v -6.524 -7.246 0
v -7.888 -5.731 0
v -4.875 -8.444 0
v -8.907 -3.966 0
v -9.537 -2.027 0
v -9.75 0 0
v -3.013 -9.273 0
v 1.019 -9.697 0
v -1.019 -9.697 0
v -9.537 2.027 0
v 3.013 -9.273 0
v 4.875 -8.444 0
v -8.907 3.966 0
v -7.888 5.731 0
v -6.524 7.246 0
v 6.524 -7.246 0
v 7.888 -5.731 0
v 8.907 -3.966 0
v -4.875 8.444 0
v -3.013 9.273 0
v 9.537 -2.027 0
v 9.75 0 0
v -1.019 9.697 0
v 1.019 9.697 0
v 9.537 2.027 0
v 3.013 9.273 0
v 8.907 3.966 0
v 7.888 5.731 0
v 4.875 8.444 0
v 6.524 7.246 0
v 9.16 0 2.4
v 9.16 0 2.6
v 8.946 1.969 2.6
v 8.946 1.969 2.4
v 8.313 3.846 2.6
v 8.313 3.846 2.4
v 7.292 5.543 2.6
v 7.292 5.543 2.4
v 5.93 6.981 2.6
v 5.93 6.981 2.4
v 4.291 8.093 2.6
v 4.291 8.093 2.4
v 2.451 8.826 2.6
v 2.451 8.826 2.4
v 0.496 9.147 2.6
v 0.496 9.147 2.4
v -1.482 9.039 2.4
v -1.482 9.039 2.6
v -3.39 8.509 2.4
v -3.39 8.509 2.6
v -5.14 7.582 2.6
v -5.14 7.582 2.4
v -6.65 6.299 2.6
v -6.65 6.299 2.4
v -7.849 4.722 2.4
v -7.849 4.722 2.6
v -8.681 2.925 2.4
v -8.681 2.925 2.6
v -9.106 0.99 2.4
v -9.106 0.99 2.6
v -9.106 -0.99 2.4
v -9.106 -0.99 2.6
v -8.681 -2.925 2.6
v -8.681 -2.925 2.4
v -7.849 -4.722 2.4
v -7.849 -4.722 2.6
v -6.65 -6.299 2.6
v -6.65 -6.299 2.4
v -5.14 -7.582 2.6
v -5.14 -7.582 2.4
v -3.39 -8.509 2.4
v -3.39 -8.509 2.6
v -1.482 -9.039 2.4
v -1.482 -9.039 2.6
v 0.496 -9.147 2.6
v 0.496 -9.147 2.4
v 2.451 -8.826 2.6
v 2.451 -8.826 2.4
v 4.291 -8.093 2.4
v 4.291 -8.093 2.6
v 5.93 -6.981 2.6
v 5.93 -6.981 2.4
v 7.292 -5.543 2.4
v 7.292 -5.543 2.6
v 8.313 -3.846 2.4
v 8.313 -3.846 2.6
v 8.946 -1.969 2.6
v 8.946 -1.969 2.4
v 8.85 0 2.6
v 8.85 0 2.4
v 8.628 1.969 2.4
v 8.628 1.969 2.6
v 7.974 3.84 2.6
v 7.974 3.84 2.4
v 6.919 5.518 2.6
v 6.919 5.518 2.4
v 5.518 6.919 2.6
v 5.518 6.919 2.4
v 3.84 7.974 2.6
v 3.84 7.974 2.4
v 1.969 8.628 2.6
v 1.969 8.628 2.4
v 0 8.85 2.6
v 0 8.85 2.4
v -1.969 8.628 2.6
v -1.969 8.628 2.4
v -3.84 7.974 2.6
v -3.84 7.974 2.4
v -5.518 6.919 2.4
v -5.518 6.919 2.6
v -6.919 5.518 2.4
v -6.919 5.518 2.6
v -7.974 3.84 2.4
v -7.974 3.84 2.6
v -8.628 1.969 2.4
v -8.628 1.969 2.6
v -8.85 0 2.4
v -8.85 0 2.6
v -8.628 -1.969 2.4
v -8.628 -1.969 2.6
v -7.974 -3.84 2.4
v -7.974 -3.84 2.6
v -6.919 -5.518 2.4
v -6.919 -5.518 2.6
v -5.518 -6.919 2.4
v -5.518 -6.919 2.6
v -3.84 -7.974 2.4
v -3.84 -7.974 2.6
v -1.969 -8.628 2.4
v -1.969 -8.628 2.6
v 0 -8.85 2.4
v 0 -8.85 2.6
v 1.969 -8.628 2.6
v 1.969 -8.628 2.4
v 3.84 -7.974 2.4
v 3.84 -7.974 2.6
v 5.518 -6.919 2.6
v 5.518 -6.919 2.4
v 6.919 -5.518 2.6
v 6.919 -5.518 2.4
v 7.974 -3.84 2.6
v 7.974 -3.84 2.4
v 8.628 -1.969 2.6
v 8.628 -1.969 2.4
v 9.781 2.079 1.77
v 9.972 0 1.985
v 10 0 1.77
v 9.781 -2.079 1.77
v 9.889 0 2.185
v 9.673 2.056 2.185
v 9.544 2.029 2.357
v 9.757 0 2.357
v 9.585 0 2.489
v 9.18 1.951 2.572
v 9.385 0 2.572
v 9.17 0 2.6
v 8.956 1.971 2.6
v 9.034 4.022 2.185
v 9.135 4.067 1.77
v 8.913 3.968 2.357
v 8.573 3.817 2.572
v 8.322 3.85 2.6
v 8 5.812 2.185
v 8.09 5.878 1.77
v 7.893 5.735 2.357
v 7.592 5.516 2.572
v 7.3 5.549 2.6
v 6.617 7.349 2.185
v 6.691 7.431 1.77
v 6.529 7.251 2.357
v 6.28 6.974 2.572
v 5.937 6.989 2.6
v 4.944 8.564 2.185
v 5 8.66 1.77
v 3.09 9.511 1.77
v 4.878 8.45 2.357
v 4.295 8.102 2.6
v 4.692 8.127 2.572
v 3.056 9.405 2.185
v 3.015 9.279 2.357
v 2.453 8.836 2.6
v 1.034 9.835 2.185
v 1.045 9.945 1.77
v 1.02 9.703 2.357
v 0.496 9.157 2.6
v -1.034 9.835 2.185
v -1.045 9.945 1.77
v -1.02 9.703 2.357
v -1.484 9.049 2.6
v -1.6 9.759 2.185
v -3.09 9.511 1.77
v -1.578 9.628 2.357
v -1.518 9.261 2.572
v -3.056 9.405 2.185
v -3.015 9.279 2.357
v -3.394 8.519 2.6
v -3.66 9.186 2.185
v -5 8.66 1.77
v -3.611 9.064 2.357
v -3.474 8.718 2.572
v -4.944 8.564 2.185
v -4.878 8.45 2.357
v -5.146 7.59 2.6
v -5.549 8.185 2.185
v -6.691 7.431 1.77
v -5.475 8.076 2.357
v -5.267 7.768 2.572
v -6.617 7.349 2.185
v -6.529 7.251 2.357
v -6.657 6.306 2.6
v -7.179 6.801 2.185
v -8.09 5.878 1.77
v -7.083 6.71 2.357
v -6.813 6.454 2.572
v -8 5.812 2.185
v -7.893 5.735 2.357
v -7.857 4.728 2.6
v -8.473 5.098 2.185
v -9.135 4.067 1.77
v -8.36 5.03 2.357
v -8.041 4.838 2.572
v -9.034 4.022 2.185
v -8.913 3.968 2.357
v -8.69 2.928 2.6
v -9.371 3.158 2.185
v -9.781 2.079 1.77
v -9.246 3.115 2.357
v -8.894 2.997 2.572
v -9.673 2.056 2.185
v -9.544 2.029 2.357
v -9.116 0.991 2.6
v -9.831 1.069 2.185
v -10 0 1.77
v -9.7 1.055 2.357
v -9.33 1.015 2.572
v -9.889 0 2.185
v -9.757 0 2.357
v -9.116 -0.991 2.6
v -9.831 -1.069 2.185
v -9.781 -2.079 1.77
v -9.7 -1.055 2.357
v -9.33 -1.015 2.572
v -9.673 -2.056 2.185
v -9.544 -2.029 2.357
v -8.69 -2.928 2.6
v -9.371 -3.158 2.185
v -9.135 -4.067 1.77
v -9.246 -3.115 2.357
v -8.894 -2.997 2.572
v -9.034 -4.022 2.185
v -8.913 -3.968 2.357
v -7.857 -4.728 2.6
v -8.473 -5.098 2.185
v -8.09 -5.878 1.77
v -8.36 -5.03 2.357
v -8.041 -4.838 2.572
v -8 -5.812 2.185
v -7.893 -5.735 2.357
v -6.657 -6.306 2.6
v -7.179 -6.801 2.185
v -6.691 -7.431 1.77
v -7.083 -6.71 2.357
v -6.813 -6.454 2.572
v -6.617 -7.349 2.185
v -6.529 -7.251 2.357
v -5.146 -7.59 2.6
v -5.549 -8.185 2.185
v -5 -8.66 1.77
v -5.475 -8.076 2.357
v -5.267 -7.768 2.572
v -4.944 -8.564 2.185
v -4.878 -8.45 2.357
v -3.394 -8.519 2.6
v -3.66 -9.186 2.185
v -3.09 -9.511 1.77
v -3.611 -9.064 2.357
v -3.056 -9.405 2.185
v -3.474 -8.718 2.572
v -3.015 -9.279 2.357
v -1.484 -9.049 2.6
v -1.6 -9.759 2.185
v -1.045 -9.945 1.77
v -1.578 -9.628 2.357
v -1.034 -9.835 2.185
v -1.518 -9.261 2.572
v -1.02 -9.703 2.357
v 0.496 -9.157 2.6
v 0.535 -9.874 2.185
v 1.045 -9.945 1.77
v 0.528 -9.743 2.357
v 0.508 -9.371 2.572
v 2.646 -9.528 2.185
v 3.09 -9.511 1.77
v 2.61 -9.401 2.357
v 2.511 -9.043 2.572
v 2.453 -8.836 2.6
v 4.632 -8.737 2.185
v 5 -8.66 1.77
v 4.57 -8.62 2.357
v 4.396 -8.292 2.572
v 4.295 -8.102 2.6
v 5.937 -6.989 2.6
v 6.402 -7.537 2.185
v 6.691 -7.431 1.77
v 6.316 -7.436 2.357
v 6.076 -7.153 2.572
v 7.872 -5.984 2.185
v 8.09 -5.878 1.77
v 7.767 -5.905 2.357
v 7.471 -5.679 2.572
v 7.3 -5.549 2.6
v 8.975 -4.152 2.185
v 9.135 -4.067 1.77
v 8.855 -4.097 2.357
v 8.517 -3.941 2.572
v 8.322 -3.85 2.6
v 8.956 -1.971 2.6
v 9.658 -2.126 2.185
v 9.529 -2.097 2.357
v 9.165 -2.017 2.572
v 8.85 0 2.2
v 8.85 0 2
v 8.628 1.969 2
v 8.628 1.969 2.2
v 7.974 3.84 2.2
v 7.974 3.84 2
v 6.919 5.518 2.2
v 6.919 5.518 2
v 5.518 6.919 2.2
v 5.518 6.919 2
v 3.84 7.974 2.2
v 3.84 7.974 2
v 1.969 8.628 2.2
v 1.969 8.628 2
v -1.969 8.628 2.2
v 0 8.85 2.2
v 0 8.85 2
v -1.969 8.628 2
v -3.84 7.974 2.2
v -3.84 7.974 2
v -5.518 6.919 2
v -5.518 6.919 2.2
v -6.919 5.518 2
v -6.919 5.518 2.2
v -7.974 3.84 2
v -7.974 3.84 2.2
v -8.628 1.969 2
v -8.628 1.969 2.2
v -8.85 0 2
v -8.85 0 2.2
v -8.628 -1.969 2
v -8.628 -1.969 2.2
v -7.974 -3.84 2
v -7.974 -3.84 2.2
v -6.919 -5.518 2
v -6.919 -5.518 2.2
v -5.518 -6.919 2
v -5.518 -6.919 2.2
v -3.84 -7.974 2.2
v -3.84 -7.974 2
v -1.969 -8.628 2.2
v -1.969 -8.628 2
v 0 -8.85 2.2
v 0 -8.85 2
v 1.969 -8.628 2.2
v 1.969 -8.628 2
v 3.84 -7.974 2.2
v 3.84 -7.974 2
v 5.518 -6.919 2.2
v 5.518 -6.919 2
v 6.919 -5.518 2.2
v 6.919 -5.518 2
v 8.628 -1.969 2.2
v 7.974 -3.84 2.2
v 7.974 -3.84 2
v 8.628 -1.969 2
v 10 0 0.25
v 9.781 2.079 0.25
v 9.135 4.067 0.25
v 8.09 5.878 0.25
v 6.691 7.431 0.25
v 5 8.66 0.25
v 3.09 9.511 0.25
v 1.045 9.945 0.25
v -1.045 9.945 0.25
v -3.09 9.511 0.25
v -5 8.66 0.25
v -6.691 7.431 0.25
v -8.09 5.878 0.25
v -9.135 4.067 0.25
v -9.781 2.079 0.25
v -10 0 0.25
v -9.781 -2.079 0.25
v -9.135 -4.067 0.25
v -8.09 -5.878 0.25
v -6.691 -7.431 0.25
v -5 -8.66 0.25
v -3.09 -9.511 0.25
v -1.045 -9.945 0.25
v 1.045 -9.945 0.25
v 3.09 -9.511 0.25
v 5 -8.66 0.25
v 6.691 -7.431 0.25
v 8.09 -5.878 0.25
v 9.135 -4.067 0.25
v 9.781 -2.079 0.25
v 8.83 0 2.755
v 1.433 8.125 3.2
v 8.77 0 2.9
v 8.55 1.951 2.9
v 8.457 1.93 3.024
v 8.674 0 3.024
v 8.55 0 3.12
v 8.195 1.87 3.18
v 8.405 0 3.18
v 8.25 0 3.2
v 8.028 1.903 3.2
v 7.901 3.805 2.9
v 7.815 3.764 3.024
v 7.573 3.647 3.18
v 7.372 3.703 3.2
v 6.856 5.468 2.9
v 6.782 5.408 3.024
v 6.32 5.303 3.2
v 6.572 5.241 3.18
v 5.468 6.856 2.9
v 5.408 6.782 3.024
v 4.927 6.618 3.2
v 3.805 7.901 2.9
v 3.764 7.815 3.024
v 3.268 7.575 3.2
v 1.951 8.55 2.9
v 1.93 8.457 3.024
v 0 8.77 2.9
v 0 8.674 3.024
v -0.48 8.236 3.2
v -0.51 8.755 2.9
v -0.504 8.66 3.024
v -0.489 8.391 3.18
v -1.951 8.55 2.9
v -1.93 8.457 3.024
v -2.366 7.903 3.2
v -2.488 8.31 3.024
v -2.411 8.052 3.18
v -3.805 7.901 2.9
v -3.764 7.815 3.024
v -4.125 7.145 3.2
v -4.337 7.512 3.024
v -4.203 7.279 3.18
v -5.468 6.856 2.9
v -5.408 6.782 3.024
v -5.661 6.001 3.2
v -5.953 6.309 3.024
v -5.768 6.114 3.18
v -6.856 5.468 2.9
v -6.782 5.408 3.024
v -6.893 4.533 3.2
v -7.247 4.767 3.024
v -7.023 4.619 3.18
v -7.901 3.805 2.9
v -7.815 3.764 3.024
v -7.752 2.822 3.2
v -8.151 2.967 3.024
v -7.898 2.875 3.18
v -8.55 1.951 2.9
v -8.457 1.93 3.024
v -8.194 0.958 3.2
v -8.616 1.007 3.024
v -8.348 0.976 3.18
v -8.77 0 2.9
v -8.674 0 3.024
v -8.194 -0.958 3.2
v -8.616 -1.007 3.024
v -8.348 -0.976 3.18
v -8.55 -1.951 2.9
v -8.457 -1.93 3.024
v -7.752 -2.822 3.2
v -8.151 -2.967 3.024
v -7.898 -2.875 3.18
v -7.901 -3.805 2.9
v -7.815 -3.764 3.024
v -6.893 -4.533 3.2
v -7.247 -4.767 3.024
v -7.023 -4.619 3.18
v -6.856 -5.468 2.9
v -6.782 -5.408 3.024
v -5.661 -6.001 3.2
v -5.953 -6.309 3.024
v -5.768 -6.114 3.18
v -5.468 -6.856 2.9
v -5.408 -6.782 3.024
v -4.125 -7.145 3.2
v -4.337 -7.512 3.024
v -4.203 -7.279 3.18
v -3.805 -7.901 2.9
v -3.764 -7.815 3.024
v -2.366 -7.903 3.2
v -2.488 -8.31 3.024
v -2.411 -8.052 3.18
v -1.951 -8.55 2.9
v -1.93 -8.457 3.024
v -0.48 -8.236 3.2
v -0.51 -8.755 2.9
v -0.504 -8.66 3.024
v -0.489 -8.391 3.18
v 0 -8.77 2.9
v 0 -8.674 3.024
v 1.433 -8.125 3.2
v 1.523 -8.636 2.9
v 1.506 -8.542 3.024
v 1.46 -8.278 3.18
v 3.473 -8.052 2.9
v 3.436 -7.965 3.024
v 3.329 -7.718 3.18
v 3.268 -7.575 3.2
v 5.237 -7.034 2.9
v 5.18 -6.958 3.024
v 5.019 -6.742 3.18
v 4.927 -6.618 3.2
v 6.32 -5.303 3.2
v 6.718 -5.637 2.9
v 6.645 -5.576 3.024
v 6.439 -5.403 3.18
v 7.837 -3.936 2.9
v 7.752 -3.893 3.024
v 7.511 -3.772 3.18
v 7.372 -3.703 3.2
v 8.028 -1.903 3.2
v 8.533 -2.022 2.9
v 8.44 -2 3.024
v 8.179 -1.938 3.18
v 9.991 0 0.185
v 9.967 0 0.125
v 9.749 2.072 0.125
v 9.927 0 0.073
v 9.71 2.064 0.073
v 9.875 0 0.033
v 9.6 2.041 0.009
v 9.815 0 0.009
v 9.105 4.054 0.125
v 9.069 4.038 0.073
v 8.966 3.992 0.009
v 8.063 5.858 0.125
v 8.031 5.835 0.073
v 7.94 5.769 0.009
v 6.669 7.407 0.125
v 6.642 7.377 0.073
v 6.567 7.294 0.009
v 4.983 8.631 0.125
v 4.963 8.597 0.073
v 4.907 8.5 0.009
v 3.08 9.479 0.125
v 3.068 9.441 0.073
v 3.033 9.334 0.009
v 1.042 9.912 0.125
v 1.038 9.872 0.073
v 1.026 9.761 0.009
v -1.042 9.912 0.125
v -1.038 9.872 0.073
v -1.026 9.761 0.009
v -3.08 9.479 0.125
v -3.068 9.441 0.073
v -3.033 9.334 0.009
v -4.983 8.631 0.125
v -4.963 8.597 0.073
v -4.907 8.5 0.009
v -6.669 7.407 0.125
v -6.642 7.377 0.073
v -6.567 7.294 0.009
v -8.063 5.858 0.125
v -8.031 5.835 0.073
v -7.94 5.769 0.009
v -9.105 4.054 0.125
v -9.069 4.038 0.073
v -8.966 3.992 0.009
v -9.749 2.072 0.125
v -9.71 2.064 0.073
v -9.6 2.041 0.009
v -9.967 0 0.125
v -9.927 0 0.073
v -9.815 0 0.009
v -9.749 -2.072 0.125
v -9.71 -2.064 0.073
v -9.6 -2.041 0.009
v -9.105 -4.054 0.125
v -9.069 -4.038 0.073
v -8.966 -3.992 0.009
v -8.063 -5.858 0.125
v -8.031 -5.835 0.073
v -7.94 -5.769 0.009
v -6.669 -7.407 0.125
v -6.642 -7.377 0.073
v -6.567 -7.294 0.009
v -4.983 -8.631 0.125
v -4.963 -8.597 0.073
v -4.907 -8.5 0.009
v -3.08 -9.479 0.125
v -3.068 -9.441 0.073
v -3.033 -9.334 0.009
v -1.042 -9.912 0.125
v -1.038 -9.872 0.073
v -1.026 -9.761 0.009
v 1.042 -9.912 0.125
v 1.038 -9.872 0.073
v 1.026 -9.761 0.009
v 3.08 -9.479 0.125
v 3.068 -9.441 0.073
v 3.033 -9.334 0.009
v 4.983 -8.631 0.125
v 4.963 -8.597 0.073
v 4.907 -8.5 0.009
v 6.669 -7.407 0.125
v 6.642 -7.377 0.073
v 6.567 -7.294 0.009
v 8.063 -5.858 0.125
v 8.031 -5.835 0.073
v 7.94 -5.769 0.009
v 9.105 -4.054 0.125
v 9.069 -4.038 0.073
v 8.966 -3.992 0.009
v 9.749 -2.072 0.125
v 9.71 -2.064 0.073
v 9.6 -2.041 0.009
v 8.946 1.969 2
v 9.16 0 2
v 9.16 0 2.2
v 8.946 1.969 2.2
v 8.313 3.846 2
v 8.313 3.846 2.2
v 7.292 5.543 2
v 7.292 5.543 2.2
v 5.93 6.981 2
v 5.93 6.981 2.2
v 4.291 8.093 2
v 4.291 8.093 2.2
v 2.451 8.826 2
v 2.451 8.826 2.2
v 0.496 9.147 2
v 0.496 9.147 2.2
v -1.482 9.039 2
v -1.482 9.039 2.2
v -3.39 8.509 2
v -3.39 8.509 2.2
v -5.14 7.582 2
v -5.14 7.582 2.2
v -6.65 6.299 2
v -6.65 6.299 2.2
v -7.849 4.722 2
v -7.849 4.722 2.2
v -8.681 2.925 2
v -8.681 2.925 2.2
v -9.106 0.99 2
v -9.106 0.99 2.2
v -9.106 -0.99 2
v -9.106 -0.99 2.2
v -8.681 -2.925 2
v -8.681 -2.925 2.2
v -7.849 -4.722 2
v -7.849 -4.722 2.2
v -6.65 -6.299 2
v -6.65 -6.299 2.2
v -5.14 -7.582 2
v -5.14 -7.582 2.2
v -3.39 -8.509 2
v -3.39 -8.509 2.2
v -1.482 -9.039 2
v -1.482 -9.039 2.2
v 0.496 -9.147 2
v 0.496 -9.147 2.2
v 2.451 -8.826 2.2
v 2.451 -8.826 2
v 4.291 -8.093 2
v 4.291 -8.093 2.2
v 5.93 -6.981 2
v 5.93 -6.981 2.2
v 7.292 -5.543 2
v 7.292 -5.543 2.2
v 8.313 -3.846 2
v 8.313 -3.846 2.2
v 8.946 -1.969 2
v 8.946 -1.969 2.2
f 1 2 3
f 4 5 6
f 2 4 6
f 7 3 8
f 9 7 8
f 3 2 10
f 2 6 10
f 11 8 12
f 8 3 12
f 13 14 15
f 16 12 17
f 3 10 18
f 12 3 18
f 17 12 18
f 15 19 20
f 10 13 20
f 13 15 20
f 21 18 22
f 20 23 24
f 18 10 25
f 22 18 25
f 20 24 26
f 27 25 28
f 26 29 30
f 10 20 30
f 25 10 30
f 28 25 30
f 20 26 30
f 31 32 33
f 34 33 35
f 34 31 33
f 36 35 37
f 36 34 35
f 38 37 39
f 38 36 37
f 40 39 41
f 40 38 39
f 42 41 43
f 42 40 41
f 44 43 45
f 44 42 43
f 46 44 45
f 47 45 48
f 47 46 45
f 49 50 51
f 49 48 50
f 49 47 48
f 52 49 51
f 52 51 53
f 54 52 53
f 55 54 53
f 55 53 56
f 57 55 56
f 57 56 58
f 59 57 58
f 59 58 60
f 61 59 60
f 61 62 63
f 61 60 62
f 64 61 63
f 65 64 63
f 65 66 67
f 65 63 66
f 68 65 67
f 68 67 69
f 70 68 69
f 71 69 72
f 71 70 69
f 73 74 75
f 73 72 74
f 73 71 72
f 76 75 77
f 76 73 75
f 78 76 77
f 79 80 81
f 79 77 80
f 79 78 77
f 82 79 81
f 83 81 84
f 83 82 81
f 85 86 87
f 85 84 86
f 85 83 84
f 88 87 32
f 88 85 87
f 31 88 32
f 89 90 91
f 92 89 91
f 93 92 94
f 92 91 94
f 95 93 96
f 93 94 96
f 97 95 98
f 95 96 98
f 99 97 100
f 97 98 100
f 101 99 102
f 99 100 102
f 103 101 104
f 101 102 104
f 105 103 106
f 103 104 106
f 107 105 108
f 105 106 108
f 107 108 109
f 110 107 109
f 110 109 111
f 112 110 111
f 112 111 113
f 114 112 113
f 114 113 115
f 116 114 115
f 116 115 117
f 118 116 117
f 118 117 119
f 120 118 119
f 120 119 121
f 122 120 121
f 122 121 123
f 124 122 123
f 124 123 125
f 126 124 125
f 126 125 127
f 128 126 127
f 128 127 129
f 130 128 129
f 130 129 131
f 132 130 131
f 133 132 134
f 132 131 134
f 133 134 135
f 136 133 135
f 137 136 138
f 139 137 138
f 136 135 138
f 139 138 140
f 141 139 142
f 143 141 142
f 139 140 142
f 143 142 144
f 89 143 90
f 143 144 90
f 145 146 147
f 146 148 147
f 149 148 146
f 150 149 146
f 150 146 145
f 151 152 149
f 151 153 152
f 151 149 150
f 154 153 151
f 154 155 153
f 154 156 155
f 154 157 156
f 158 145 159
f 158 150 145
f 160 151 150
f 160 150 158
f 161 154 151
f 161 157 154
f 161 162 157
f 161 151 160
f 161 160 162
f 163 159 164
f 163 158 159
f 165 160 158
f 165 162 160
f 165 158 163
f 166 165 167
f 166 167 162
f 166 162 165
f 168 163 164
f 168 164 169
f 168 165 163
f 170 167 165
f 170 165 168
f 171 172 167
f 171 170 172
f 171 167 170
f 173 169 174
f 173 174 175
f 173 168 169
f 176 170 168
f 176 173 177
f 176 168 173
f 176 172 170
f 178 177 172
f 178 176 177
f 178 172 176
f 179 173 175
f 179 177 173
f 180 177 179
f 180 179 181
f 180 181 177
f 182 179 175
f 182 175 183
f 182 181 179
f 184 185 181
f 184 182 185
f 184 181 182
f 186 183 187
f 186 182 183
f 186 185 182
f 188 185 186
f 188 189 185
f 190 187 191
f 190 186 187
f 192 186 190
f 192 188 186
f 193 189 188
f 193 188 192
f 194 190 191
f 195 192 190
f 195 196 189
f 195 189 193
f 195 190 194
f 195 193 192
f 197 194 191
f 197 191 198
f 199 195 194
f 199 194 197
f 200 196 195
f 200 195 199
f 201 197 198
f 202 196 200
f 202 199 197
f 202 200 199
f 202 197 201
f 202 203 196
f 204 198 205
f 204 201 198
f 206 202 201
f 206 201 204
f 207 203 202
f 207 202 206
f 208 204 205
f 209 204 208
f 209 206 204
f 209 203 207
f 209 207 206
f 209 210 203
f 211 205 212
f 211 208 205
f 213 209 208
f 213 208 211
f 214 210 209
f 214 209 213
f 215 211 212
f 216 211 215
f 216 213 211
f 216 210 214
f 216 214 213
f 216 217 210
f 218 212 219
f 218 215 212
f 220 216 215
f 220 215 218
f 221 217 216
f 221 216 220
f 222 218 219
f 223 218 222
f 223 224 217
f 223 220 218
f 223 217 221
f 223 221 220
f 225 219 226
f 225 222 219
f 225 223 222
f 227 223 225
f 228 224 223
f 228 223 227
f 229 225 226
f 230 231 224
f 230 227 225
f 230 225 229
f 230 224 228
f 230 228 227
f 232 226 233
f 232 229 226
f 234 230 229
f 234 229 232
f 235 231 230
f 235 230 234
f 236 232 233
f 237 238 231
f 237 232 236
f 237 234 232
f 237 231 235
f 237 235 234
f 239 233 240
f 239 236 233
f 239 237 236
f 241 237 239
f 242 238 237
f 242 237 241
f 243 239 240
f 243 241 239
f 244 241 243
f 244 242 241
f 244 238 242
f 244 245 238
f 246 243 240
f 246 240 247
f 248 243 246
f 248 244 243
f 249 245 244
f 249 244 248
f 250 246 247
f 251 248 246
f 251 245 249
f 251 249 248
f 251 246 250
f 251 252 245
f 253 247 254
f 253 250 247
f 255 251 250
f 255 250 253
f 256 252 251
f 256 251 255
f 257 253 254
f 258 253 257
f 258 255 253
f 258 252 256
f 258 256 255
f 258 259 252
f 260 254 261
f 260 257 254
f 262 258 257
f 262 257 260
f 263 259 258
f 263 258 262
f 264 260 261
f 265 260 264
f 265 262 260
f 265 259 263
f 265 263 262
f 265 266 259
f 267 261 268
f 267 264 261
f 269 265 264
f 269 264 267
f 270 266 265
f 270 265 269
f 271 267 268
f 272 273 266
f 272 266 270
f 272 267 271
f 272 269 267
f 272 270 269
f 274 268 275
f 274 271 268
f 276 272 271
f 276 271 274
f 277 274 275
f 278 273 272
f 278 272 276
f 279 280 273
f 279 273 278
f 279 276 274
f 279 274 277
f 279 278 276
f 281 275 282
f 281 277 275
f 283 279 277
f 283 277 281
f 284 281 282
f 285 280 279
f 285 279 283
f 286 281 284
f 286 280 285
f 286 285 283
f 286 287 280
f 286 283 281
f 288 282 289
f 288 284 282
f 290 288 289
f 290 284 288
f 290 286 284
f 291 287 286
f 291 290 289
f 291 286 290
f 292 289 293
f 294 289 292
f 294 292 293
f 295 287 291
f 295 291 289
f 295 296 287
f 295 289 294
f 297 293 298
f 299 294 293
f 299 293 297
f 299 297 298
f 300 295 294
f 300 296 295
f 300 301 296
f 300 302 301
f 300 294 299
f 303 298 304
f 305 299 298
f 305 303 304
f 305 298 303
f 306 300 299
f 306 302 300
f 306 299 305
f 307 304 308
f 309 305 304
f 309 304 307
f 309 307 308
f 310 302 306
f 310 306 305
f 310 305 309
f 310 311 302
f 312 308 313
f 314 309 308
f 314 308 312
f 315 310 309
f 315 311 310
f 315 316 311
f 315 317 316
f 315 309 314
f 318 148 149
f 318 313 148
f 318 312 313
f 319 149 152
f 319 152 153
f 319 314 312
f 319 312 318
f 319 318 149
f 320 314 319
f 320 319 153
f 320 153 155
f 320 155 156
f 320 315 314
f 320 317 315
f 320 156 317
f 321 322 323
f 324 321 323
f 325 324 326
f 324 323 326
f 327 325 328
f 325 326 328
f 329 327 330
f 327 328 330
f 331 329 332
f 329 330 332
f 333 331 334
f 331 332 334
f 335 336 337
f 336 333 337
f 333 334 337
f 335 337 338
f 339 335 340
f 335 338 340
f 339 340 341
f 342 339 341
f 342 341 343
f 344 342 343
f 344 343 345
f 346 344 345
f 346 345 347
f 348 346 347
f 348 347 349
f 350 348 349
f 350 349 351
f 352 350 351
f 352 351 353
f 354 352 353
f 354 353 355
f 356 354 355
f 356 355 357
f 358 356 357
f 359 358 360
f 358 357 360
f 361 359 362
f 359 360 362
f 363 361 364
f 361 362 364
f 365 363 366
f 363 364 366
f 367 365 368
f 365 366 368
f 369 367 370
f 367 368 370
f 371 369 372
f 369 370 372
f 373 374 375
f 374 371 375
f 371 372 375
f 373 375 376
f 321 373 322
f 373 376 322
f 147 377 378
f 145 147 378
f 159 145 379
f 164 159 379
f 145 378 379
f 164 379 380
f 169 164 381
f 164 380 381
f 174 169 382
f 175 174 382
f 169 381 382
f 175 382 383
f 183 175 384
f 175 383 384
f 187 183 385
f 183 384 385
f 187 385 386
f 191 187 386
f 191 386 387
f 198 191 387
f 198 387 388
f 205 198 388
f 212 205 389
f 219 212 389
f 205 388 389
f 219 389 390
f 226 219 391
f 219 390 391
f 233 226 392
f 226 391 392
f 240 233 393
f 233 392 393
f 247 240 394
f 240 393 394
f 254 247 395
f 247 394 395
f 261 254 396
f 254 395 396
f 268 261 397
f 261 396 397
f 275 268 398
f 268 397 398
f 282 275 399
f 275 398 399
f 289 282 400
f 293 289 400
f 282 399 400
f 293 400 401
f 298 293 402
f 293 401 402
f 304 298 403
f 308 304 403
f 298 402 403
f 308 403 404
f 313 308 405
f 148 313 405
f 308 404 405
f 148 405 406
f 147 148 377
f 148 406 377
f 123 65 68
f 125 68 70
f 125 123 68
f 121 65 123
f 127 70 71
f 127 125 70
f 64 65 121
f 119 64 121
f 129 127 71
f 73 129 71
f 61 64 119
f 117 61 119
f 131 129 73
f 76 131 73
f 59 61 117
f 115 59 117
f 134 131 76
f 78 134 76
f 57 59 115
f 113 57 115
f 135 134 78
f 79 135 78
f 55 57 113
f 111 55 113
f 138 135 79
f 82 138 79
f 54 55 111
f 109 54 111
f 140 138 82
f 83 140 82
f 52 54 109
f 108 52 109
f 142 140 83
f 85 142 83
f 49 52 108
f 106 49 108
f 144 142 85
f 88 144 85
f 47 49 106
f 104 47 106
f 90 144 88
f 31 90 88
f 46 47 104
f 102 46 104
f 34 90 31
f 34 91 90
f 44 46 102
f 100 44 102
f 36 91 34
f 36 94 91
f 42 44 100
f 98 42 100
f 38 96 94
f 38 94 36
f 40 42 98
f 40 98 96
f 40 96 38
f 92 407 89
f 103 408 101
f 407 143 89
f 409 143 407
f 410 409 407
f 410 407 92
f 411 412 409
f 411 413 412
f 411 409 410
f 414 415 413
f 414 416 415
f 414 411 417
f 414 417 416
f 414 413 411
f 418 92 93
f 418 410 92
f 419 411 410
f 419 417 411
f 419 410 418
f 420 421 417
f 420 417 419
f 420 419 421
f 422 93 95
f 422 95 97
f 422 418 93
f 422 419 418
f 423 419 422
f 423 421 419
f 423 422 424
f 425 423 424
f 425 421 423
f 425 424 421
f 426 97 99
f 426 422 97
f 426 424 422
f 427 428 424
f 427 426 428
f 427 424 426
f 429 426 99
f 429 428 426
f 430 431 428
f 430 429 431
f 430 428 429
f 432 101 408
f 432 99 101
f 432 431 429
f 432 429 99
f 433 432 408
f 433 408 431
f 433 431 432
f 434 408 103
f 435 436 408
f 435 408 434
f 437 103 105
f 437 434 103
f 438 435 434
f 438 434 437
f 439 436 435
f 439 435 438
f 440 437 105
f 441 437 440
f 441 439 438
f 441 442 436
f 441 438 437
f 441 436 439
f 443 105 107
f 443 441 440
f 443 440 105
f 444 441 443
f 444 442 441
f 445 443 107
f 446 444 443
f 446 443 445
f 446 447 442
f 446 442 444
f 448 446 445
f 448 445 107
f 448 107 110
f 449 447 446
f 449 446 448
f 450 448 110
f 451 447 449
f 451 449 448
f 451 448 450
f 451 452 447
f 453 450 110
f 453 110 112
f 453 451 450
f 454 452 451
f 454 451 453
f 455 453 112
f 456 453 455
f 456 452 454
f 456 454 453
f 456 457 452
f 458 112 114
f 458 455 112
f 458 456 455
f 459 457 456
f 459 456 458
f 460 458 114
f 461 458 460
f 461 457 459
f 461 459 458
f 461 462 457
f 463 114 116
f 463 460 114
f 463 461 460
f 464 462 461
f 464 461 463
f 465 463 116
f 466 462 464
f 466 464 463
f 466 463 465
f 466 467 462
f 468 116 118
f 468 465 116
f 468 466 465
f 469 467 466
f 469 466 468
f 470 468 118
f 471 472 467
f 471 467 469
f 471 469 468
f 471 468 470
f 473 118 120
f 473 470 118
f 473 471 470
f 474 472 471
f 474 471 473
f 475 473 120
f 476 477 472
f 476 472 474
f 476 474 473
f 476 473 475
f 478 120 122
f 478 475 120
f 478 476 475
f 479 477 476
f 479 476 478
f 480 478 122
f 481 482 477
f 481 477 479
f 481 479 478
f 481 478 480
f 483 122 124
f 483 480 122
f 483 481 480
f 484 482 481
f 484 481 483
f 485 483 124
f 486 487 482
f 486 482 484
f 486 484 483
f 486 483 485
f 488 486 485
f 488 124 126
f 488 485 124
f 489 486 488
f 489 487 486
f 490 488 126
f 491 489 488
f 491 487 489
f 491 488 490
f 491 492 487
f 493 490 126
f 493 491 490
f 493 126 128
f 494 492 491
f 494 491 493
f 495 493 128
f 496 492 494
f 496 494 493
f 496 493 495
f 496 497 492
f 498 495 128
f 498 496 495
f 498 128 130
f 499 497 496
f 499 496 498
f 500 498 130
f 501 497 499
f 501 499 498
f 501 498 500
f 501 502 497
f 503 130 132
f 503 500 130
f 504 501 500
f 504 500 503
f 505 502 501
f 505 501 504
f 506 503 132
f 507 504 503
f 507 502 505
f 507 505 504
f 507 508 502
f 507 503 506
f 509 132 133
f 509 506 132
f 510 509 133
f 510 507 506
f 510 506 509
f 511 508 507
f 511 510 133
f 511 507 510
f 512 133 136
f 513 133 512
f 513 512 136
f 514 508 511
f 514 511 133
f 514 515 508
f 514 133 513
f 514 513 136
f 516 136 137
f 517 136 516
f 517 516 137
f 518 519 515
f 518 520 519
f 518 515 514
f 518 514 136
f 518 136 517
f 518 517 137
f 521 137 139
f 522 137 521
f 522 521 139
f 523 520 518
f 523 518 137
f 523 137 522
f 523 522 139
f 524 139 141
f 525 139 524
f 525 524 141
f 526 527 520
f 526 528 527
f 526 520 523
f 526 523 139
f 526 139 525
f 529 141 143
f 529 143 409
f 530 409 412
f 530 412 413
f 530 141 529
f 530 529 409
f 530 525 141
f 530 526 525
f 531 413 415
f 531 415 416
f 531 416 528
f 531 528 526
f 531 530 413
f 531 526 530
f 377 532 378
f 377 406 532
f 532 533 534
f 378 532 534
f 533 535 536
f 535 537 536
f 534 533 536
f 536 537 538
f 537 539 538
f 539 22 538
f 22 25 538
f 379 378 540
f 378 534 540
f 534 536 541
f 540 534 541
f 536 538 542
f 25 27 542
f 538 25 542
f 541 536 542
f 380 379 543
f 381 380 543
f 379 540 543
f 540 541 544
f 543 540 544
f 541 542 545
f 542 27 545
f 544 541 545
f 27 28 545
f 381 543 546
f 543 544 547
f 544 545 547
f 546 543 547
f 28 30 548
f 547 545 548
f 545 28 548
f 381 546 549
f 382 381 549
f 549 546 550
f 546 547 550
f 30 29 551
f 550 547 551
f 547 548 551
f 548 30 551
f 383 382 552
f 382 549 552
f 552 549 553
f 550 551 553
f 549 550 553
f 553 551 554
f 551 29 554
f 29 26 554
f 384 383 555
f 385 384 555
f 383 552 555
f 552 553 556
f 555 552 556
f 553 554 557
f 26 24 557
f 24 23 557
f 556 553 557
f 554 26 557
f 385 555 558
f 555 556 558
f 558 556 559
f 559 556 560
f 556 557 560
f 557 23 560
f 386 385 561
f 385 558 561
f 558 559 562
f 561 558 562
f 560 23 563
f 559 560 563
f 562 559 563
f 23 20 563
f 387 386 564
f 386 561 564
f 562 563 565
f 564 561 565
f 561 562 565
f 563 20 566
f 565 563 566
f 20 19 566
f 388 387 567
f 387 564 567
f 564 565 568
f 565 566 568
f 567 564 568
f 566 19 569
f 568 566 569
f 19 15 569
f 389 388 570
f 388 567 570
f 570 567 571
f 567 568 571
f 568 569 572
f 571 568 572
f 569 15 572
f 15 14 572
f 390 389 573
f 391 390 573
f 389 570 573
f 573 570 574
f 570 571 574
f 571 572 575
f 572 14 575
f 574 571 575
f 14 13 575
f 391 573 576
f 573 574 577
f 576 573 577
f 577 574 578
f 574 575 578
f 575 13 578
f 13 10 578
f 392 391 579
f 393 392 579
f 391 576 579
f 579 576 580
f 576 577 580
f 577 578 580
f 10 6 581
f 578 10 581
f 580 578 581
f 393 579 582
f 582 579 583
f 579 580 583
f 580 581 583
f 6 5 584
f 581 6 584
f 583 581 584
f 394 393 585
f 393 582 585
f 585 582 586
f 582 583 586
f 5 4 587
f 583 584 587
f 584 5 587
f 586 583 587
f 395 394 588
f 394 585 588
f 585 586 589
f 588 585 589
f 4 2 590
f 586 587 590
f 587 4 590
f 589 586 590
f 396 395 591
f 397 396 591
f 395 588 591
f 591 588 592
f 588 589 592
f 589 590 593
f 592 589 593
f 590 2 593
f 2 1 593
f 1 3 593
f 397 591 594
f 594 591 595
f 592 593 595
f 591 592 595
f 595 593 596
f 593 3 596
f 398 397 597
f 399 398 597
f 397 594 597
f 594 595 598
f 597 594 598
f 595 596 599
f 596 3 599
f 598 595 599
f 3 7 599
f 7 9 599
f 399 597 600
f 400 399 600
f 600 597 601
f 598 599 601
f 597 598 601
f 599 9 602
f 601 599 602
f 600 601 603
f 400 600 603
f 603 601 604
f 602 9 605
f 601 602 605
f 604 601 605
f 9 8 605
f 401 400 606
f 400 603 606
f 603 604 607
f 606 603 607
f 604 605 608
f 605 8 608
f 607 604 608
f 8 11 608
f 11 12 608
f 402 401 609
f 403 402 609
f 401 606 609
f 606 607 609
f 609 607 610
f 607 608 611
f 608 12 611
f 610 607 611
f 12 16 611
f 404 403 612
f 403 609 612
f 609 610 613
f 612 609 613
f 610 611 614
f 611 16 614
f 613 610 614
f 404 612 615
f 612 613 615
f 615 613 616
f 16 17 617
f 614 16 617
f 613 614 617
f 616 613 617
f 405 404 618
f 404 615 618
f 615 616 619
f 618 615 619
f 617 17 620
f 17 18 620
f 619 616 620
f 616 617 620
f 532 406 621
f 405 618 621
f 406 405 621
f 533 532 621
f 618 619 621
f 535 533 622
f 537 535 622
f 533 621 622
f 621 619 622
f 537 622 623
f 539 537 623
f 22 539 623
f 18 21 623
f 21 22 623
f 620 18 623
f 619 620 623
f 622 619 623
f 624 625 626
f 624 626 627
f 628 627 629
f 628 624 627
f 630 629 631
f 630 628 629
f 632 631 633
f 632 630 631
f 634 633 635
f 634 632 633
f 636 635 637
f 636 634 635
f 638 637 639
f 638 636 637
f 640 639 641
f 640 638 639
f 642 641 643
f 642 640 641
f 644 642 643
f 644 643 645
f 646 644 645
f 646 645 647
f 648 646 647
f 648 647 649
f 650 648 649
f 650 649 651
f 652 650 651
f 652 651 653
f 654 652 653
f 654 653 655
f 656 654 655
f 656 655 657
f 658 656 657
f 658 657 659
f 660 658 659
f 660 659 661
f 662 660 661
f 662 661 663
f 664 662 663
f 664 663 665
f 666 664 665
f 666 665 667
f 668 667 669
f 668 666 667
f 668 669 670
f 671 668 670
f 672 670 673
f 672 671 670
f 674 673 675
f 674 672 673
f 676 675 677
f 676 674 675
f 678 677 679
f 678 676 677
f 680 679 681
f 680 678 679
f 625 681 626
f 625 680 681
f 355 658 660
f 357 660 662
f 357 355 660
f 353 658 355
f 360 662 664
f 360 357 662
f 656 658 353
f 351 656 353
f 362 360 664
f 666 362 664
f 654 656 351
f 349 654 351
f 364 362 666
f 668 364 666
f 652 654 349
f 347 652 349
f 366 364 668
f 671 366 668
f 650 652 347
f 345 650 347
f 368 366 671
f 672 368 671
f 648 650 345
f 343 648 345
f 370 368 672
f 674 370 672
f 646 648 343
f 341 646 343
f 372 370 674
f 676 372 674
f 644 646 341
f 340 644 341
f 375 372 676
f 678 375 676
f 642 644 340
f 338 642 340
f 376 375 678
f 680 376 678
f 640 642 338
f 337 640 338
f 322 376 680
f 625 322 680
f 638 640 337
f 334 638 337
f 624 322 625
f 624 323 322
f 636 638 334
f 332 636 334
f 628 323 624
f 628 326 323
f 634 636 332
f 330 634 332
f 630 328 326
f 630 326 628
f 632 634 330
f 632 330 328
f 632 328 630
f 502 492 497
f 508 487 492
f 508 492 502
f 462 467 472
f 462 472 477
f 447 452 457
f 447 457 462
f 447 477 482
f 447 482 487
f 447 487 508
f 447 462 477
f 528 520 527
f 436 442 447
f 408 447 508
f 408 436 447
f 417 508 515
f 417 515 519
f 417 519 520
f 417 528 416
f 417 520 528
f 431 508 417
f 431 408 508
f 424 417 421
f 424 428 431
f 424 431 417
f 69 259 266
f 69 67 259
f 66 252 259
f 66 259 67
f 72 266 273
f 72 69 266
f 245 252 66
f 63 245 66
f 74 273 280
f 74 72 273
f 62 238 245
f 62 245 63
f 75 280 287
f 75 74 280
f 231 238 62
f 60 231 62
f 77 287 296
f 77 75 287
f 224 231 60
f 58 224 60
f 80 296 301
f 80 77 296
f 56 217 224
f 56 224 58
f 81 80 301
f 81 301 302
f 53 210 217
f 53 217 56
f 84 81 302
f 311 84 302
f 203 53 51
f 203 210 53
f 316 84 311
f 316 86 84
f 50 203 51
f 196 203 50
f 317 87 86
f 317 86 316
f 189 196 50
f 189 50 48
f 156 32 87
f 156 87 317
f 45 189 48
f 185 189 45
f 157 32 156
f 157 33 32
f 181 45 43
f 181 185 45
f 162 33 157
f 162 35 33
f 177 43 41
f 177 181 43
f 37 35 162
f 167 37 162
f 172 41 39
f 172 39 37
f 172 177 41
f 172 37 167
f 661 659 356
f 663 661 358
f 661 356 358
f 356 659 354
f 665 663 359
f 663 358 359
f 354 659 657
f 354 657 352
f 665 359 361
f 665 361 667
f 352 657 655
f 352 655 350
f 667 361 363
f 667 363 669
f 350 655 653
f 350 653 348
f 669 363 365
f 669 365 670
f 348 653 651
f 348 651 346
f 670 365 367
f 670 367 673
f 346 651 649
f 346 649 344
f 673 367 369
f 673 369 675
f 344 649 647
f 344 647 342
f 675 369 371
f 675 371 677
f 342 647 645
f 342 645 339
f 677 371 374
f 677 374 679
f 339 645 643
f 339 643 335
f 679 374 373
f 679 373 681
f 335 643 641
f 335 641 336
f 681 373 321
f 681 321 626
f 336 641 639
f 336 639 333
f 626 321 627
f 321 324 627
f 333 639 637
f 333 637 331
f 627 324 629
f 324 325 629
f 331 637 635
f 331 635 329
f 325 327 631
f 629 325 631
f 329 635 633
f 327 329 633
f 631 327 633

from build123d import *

# Parameters (mm, degrees)
CYLINDER002_R     = 9.16
CYLINDER002_DEPTH = 18
CYLINDER_R        = 10
CYLINDER_DEPTH    = 2.6
CYLINDER001_R     = 8.85
CYLINDER001_DEPTH = 3
FILLET_1_R        = 0.83
FILLET_2_R        = 0.6
FILLET_3_R        = 0.25
CYLINDER003_R     = 9.16
CYLINDER003_DEPTH = 0.2


with BuildPart() as inside_cut:
    # Cylinder002 → Cylinder002 (new body)
    with BuildSketch(Plane.XY.offset(2)):
        Circle(CYLINDER002_R)
    extrude(amount=CYLINDER002_DEPTH)


with BuildPart() as cut:
    # Cylinder → Cylinder (new body)
    with BuildSketch(Plane.XY):
        Circle(CYLINDER_R)
    extrude(amount=CYLINDER_DEPTH)

    # Cut: cut inside_cut
    add(inside_cut.part, mode=Mode.SUBTRACT)


with BuildPart() as battery:
    # Cylinder001 → Cylinder001 (new body)
    with BuildSketch(Plane.XY.offset(0.2)):
        Circle(CYLINDER001_R)
    extrude(amount=CYLINDER001_DEPTH)

    # Fusion: union Cut
    add(cut.part)

    # Fillet 1
    fillet_1_edges = [battery.edges().sort_by_distance(p)[0] for p in [
        (-10, 0, 2.6),
    ]]
    fillet(fillet_1_edges, radius=FILLET_1_R)

    # Fillet 2
    fillet_2_edges = [battery.edges().sort_by_distance(p)[0] for p in [
        (-8.85, 0, 3.2),
    ]]
    fillet(fillet_2_edges, radius=FILLET_2_R)

    # Fillet 3
    fillet_3_edges = [battery.edges().sort_by_distance(p)[0] for p in [
        (-10, 0, 0),
    ]]
    fillet(fillet_3_edges, radius=FILLET_3_R)


with BuildPart() as battery_final:
    # Cylinder003 → Cylinder003 (new body)
    with BuildSketch(Plane.XY.offset(2.2)):
        Circle(CYLINDER003_R)
    extrude(amount=CYLINDER003_DEPTH)

    # Fusion001: union battery
    add(battery.part)


solid = battery_final.part
